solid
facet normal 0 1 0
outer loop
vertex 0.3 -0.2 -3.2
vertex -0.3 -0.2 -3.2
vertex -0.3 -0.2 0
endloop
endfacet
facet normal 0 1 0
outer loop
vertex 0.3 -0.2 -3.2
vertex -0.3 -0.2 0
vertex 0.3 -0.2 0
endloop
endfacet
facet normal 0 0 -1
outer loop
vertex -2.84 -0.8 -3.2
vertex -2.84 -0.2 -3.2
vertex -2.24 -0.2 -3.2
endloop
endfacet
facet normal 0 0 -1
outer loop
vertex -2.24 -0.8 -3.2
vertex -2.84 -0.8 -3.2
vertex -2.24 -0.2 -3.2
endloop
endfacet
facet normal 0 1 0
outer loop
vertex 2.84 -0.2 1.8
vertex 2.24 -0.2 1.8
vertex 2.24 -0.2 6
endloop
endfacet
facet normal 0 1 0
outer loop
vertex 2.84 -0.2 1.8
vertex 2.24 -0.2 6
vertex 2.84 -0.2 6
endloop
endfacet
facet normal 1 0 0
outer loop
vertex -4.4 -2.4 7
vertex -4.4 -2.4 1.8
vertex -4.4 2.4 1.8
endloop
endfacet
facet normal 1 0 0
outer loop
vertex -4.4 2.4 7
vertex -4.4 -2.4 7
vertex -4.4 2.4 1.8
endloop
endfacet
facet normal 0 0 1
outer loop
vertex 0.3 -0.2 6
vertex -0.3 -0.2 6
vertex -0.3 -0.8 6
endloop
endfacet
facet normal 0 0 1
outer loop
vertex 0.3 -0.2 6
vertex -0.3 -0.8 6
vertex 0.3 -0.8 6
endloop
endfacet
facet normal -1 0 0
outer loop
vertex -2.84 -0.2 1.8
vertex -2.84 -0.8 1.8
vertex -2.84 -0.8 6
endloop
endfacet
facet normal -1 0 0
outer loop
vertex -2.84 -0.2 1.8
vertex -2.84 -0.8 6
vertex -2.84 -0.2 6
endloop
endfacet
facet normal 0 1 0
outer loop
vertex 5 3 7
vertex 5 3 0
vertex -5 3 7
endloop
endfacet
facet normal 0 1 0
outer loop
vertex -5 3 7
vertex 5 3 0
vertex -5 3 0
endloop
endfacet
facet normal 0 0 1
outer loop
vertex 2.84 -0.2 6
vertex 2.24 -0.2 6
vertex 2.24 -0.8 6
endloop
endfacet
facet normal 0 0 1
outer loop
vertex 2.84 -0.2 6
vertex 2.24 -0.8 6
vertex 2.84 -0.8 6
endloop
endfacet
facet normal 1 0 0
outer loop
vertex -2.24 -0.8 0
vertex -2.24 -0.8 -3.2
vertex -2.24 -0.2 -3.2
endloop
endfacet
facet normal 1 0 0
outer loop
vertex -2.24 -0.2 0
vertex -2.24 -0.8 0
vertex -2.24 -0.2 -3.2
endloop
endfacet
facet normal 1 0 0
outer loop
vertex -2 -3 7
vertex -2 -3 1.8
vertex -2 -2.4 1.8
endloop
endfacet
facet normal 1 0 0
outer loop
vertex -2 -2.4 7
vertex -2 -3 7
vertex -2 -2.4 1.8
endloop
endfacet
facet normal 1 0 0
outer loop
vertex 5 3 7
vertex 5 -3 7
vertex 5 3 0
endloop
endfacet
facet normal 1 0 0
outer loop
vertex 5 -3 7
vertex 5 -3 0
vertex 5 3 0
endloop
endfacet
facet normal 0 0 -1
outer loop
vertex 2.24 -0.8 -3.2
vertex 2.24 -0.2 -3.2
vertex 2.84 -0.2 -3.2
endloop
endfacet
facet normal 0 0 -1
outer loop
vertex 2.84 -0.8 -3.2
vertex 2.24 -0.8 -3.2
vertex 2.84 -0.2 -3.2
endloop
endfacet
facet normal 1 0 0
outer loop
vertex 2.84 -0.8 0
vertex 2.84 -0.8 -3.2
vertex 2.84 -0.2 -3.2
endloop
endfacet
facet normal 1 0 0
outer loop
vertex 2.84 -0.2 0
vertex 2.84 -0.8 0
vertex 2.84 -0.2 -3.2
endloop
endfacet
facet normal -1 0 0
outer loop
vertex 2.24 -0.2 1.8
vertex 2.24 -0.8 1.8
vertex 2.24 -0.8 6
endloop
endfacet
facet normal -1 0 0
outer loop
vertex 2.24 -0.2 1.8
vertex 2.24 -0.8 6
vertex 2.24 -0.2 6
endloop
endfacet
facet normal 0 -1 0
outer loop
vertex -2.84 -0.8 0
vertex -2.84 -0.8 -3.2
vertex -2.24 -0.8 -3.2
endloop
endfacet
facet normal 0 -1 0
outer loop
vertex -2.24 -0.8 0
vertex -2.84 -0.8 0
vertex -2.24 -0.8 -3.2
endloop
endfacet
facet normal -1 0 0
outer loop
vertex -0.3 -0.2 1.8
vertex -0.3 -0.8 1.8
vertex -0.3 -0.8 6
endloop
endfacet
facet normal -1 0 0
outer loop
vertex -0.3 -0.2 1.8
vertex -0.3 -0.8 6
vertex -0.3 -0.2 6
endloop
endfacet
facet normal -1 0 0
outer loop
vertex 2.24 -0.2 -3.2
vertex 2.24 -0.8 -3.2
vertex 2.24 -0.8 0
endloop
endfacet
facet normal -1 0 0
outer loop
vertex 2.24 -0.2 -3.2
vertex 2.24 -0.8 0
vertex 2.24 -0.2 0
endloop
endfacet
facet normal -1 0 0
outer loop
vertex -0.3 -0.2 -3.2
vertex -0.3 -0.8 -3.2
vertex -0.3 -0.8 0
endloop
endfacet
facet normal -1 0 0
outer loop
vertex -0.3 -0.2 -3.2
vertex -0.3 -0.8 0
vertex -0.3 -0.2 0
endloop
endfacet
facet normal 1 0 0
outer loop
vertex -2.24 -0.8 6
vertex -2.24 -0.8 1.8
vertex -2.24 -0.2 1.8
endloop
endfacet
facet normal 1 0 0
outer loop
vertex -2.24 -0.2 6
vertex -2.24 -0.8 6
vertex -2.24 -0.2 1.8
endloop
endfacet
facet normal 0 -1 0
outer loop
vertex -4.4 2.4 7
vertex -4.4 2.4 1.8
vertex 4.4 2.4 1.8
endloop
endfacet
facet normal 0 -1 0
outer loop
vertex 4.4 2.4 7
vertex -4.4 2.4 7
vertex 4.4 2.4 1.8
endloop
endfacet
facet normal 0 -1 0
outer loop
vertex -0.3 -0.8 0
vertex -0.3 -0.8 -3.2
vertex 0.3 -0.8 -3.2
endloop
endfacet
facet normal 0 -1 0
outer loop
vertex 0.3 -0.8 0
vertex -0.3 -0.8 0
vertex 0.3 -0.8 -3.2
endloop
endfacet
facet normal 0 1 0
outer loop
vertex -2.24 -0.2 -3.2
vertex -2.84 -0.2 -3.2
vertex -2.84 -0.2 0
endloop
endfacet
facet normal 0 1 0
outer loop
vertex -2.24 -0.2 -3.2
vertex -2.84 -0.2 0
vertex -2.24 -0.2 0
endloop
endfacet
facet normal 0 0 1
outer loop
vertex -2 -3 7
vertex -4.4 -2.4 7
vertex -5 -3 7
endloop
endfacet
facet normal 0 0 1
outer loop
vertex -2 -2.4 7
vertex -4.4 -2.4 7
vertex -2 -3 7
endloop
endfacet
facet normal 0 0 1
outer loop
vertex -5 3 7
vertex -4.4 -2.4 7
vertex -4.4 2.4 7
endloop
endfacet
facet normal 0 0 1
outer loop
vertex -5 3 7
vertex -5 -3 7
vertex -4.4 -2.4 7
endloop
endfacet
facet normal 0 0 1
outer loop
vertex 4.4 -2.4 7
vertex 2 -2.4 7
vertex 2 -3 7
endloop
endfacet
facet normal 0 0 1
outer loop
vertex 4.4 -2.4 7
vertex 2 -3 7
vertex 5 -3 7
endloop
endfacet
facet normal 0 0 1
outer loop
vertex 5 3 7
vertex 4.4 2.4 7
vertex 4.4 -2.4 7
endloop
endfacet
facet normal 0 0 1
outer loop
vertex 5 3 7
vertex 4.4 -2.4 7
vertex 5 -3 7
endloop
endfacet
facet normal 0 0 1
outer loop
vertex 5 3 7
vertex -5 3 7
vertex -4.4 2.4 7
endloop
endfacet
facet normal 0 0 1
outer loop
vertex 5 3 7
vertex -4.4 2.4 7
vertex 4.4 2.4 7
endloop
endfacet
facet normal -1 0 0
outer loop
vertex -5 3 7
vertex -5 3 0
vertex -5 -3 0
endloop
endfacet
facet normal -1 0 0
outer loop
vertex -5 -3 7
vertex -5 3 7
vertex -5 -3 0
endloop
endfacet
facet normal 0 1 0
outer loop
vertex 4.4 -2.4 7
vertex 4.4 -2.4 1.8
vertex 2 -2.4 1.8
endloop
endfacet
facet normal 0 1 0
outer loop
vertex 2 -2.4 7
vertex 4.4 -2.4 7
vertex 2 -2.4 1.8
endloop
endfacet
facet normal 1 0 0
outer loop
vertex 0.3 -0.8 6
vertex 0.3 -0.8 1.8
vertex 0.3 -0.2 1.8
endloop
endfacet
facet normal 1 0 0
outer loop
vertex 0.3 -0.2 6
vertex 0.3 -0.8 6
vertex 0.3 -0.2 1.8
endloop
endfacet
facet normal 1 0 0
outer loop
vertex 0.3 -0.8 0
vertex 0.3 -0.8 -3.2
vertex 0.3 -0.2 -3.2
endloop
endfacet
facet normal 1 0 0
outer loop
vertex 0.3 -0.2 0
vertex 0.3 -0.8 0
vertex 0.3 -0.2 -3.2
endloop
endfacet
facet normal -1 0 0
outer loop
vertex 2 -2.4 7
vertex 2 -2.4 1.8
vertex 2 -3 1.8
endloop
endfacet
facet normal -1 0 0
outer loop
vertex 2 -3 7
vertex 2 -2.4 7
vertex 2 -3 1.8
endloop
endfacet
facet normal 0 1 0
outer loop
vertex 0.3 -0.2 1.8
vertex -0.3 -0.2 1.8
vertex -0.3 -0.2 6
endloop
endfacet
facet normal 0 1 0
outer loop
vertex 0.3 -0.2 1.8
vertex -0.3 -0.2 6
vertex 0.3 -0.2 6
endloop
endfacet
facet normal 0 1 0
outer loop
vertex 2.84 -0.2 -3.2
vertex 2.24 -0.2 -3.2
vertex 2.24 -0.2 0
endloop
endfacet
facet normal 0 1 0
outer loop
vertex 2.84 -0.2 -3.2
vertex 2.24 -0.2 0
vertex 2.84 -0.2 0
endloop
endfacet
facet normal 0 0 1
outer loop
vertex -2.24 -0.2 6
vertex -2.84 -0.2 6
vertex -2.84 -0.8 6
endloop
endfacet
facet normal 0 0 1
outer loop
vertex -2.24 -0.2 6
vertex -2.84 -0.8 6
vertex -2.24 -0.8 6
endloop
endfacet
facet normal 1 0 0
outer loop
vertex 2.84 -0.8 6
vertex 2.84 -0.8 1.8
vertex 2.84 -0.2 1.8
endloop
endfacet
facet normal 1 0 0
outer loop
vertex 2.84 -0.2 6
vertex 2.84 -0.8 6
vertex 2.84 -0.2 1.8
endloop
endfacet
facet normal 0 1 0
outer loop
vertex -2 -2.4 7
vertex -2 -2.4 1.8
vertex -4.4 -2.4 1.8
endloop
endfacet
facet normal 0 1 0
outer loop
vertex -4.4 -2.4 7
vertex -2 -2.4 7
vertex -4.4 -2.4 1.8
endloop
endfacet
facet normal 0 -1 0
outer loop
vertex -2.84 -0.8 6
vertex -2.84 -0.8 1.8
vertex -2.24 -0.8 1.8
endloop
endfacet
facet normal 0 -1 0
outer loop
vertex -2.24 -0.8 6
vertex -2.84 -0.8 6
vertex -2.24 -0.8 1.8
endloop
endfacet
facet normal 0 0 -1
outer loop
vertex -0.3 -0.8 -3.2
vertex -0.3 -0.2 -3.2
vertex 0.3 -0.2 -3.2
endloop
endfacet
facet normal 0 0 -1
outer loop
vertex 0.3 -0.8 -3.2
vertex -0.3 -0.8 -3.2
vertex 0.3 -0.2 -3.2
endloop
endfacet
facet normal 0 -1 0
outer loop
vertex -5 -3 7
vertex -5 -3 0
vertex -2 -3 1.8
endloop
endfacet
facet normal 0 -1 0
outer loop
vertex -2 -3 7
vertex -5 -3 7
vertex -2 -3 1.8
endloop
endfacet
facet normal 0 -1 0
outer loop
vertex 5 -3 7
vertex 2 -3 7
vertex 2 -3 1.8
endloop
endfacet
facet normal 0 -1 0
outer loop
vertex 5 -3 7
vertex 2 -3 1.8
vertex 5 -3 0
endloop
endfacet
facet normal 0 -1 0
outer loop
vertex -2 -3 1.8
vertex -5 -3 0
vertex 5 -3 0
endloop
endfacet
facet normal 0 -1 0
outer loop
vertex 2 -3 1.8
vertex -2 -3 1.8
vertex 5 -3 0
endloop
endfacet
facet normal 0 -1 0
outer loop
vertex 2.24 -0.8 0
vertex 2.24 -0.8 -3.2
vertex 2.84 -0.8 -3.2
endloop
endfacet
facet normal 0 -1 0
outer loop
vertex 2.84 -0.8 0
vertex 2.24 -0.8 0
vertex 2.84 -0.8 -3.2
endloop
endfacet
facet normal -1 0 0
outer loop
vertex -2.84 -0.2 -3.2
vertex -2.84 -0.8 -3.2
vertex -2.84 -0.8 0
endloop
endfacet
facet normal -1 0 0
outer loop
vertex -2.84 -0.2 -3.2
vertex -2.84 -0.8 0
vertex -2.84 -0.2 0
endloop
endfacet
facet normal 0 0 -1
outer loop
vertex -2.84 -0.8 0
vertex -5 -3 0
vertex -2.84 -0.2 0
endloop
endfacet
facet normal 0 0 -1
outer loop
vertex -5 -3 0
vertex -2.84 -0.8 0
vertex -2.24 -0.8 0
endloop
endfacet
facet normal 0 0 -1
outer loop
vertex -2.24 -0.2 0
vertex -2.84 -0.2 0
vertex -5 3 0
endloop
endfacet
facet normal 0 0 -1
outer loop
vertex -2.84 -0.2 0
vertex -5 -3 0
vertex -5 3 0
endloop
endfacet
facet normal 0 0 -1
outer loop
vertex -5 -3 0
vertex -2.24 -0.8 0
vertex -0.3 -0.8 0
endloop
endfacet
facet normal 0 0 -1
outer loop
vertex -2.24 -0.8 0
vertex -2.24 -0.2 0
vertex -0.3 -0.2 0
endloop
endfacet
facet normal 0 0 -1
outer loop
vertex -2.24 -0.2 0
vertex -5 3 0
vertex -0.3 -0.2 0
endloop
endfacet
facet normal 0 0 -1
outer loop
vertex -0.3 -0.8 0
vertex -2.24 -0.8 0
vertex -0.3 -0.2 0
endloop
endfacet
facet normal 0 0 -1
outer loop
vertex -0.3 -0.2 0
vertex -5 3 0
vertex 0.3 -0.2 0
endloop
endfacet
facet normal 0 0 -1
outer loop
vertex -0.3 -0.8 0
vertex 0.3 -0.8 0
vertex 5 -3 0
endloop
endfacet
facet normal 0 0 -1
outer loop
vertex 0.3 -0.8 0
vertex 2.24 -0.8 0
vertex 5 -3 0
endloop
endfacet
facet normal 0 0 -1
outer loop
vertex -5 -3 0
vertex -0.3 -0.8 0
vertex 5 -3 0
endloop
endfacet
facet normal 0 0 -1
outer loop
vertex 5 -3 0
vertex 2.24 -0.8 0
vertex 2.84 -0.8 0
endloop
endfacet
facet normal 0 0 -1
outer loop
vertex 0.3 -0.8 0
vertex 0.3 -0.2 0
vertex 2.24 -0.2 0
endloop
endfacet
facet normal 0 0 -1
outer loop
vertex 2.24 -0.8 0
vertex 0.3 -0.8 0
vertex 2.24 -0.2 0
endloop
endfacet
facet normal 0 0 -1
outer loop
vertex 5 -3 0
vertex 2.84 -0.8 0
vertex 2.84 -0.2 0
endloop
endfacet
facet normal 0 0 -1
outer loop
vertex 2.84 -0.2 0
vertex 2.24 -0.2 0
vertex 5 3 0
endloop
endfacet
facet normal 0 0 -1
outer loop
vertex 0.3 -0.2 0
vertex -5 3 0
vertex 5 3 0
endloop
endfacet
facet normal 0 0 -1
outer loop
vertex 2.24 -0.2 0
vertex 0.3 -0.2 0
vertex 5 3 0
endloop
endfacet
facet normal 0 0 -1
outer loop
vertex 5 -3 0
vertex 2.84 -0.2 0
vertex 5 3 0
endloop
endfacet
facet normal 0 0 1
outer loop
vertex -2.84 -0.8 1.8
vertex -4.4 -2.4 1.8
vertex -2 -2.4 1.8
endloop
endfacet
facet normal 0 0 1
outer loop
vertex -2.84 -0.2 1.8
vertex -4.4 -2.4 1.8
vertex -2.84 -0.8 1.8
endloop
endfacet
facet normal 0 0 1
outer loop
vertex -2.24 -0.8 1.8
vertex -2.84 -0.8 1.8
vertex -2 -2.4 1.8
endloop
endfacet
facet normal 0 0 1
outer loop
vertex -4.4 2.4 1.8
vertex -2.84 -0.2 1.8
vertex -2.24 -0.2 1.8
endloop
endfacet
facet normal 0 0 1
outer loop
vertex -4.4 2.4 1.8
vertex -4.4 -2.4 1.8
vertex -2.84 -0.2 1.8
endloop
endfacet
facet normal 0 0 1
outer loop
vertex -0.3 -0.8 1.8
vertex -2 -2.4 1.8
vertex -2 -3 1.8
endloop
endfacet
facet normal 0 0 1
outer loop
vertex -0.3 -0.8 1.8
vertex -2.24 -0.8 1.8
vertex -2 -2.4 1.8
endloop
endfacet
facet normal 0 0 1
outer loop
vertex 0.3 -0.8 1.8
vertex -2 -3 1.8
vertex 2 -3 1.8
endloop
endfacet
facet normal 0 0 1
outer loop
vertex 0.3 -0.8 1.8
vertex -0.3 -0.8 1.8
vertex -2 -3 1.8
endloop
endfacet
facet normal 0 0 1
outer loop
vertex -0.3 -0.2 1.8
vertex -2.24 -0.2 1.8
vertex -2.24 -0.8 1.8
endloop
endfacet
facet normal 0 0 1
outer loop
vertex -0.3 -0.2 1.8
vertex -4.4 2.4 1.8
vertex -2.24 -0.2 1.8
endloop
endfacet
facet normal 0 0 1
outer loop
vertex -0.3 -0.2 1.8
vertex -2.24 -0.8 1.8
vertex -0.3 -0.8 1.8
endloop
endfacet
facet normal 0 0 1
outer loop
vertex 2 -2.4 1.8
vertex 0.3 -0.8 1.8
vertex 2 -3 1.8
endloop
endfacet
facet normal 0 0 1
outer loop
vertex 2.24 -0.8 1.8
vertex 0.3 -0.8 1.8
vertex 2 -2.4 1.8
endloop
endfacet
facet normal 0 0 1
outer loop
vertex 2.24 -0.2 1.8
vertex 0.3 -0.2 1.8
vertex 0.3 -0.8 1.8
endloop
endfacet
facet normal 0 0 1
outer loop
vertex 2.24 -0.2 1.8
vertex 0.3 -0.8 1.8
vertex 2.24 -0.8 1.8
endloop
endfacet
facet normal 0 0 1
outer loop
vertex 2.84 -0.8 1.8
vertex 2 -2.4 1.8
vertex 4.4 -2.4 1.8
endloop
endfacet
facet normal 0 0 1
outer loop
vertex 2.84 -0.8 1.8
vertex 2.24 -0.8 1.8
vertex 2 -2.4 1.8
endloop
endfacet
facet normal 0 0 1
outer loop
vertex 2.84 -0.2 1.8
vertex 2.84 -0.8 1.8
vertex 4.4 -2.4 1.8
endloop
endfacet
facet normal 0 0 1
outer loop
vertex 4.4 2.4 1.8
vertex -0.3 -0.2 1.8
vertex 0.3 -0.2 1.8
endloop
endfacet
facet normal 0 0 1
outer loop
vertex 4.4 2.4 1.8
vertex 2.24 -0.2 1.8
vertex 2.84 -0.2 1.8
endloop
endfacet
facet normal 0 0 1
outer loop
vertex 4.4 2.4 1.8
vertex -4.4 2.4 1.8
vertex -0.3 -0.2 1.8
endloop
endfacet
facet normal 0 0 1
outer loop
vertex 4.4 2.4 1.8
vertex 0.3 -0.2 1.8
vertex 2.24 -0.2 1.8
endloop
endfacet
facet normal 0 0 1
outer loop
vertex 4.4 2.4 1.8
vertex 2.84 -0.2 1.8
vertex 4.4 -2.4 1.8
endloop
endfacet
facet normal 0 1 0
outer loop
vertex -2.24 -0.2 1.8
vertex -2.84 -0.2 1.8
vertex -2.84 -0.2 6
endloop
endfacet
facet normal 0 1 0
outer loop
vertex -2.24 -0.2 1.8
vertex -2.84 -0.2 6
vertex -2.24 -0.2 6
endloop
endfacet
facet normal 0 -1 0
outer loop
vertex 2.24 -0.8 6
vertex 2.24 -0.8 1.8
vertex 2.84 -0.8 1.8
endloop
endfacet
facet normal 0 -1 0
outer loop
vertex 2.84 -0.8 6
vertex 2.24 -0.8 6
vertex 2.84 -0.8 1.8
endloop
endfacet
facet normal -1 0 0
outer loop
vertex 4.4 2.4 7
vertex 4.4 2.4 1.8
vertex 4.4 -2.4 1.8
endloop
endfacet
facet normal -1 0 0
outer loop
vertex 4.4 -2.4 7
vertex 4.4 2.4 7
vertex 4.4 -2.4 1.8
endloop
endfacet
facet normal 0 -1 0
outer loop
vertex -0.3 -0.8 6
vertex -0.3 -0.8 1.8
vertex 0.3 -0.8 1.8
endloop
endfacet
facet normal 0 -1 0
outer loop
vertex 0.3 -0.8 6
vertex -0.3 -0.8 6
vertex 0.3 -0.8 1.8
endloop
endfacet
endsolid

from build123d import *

# Parameters (mm, degrees)
SKETCH1_W           = 10
SKETCH1_H           = 6
BOSS_EXTRUDE1_DEPTH = 1.8
BOSS_EXTRUDE2_DEPTH = 5.2
BOSS_EXTRUDE3_START = -5
SKETCH3_W           = 0.6
SKETCH3_H           = 0.6
BOSS_EXTRUDE3_DEPTH = 9.2
LPATTERN1_COUNT     = 3
LPATTERN1_PITCH     = 2.54


with BuildPart() as part:
    # Sketch1 → Boss-Extrude1 (new body)
    with BuildSketch(Plane.XY):
        Rectangle(SKETCH1_W, SKETCH1_H)
    extrude(amount=BOSS_EXTRUDE1_DEPTH)

    # Sketch2 → Boss-Extrude2 (add)
    with BuildSketch(Plane.XY.offset(1.8)):
        Polygon((-2, -3), (-2, -2.4), (-4.4, -2.4), (-4.4, 2.4), (4.4, 2.4), (4.4, -2.4), (2, -2.4), (2, -3), (5, -3), (5, 3), (-5, 3), (-5, -3), align=None)
    extrude(amount=BOSS_EXTRUDE2_DEPTH)

    # Sketch3 → Boss-Extrude3 (add)
    with BuildSketch(Plane.XY.offset(1.8).offset(BOSS_EXTRUDE3_START)):
        with Locations((-2.54, -0.5)):
            Rectangle(SKETCH3_W, SKETCH3_H)
    boss_extrude3 = extrude(amount=BOSS_EXTRUDE3_DEPTH)

    # LPattern1: Boss-Extrude3 ×3
    with Locations(*[(i * LPATTERN1_PITCH, 0, 0) for i in range(1, LPATTERN1_COUNT)]):
        add(boss_extrude3)


solid = part.part
